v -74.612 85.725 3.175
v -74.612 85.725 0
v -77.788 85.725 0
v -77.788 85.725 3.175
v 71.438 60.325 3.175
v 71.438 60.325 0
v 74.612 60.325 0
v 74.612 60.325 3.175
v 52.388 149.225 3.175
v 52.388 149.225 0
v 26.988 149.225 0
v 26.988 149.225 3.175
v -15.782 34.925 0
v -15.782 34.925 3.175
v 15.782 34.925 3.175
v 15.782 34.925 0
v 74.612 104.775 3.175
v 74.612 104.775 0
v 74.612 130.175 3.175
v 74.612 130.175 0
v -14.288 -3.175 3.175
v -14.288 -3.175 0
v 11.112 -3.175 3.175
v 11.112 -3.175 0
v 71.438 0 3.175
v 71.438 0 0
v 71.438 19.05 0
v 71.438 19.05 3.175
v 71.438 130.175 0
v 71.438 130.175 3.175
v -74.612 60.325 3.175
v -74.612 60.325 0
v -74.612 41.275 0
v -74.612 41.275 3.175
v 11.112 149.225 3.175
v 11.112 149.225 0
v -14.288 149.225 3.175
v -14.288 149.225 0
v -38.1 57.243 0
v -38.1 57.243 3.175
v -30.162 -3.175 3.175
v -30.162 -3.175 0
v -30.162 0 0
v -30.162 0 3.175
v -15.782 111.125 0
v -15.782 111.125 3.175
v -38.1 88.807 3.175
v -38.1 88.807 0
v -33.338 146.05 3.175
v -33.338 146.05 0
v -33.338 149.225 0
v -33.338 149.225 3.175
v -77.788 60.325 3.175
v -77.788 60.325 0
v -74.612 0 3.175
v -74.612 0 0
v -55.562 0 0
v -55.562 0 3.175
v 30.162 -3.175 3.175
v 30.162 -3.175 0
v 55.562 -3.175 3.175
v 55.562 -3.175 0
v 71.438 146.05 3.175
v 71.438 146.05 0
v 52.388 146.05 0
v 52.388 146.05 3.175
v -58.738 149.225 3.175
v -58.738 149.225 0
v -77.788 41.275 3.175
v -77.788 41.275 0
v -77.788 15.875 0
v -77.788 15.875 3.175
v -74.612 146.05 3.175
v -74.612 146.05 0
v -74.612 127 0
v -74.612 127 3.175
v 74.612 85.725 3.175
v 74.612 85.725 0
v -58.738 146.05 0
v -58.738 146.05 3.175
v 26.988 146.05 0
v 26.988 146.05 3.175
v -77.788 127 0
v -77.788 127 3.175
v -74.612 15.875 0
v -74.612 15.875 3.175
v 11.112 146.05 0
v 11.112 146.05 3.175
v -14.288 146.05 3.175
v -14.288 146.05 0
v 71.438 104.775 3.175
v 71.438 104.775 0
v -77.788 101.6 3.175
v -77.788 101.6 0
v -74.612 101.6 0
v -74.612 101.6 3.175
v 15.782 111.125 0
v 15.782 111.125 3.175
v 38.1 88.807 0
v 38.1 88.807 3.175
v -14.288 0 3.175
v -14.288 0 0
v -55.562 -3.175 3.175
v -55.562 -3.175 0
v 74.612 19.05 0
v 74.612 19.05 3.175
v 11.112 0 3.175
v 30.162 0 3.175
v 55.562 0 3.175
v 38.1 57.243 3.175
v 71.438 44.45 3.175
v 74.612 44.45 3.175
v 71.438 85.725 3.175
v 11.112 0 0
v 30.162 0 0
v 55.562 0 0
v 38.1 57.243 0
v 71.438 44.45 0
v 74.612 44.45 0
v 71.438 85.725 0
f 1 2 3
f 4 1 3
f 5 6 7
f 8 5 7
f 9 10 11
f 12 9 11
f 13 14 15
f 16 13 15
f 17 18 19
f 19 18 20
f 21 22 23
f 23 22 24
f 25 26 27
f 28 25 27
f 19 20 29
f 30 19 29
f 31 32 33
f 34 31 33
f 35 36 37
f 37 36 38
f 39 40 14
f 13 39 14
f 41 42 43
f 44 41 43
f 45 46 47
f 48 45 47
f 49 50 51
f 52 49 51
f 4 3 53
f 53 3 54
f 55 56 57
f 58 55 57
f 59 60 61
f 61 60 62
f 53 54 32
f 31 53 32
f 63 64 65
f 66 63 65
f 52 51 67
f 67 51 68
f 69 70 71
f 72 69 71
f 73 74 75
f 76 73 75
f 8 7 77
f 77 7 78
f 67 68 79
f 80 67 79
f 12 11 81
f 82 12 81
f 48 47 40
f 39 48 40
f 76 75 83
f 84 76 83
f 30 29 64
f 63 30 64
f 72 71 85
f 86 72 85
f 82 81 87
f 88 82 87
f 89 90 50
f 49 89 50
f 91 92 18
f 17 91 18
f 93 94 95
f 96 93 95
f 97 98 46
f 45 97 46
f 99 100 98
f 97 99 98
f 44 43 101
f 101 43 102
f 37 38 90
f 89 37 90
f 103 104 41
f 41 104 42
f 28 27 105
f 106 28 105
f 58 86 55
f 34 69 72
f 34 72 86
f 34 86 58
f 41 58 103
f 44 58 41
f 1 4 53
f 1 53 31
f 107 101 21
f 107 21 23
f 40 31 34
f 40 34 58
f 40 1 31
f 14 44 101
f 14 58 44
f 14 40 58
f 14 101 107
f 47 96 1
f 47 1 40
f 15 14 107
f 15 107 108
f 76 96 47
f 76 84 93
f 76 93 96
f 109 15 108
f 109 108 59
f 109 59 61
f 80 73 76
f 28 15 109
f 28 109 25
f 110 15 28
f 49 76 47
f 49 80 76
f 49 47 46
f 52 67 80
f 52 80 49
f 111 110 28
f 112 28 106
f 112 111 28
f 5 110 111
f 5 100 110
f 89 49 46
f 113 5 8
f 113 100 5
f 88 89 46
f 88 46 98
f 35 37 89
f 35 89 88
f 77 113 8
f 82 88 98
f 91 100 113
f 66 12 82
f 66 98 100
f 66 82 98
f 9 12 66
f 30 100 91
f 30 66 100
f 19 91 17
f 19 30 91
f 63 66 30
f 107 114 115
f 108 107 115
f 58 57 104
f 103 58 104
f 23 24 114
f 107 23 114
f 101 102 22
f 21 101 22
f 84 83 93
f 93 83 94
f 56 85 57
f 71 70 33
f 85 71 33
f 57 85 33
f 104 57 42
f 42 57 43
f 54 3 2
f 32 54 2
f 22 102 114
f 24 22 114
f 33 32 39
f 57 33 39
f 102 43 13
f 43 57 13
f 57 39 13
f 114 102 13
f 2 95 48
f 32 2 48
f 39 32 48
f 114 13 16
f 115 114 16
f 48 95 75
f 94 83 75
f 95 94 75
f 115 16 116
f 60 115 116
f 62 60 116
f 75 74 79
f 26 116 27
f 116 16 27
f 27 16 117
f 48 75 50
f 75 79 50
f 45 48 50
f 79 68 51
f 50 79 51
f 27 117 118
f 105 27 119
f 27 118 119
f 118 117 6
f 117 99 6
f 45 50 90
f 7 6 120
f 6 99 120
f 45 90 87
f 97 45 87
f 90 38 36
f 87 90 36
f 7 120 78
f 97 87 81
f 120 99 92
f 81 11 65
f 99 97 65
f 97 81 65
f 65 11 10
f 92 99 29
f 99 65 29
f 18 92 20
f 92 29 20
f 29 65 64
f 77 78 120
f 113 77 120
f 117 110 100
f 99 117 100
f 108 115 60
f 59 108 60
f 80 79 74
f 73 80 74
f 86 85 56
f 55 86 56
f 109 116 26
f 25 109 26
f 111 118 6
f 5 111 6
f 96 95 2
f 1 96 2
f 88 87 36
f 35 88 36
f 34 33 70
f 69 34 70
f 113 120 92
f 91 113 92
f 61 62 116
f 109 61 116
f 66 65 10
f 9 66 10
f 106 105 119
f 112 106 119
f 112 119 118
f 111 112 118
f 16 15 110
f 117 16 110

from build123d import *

# Parameters (mm, degrees)
BOSS_EXTRUDE1_DEPTH = 3.175
CUT_EXTRUDE1_DEPTH  = 4.175


with BuildPart() as part:
    # Sketch1 → Boss-Extrude1 (new body)
    with BuildSketch(Plane.XY):
        Polygon((-33.3375, 149.225), (-58.7375, 149.225), (-58.7375, 146.05), (-74.6125, 146.05), (-74.6125, 127), (-77.7875, 127), (-77.7875, 101.6), (-74.6125, 101.6), (-74.6125, 85.725), (-77.7875, 85.725), (-77.7875, 60.325), (-74.6125, 60.325), (-74.6125, 41.275), (-77.7875, 41.275), (-77.7875, 15.875), (-74.6125, 15.875), (-74.6125, 0), (-55.5625, 0), (-55.5625, -3.175), (-30.1625, -3.175), (-30.1625, 0), (-14.2875, 0), (-14.2875, -3.175), (11.1125, -3.175), (11.1125, 0), (30.1625, 0), (30.1625, -3.175), (55.5625, -3.175), (55.5625, 0), (71.4375, 0), (71.4375, 19.05), (74.6125, 19.05), (74.6125, 44.45), (71.4375, 44.45), (71.4375, 60.325), (74.6125, 60.325), (74.6125, 85.725), (71.4375, 85.725), (71.4375, 104.775), (74.6125, 104.775), (74.6125, 130.175), (71.4375, 130.175), (71.4375, 146.05), (52.3875, 146.05), (52.3875, 149.225), (26.9875, 149.225), (26.9875, 146.05), (11.1125, 146.05), (11.1125, 149.225), (-14.2875, 149.225), (-14.2875, 146.05), (-33.3375, 146.05), align=None)
    extrude(amount=BOSS_EXTRUDE1_DEPTH)

    # Sketch2 → Cut-Extrude1 (cut, through all)
    with BuildSketch(Plane.XY.offset(3.175)):
        Polygon((-38.1, 73.025), (0, 73.025), (0, 111.125), (-15.781536726, 111.125), (-38.1, 88.806536726), align=None)
        Polygon((0, 111.125), (0, 73.025), (38.1, 73.025), (38.1, 88.806536726), (15.781536726, 111.125), align=None)
        Polygon((0, 73.025), (0, 34.925), (15.781536726, 34.925), (38.1, 57.243463274), (38.1, 73.025), align=None)
        Polygon((-15.781536726, 34.925), (0, 34.925), (0, 73.025), (-38.1, 73.025), (-38.1, 57.243463274), align=None)
    extrude(amount=-CUT_EXTRUDE1_DEPTH, mode=Mode.SUBTRACT)


solid = part.part
